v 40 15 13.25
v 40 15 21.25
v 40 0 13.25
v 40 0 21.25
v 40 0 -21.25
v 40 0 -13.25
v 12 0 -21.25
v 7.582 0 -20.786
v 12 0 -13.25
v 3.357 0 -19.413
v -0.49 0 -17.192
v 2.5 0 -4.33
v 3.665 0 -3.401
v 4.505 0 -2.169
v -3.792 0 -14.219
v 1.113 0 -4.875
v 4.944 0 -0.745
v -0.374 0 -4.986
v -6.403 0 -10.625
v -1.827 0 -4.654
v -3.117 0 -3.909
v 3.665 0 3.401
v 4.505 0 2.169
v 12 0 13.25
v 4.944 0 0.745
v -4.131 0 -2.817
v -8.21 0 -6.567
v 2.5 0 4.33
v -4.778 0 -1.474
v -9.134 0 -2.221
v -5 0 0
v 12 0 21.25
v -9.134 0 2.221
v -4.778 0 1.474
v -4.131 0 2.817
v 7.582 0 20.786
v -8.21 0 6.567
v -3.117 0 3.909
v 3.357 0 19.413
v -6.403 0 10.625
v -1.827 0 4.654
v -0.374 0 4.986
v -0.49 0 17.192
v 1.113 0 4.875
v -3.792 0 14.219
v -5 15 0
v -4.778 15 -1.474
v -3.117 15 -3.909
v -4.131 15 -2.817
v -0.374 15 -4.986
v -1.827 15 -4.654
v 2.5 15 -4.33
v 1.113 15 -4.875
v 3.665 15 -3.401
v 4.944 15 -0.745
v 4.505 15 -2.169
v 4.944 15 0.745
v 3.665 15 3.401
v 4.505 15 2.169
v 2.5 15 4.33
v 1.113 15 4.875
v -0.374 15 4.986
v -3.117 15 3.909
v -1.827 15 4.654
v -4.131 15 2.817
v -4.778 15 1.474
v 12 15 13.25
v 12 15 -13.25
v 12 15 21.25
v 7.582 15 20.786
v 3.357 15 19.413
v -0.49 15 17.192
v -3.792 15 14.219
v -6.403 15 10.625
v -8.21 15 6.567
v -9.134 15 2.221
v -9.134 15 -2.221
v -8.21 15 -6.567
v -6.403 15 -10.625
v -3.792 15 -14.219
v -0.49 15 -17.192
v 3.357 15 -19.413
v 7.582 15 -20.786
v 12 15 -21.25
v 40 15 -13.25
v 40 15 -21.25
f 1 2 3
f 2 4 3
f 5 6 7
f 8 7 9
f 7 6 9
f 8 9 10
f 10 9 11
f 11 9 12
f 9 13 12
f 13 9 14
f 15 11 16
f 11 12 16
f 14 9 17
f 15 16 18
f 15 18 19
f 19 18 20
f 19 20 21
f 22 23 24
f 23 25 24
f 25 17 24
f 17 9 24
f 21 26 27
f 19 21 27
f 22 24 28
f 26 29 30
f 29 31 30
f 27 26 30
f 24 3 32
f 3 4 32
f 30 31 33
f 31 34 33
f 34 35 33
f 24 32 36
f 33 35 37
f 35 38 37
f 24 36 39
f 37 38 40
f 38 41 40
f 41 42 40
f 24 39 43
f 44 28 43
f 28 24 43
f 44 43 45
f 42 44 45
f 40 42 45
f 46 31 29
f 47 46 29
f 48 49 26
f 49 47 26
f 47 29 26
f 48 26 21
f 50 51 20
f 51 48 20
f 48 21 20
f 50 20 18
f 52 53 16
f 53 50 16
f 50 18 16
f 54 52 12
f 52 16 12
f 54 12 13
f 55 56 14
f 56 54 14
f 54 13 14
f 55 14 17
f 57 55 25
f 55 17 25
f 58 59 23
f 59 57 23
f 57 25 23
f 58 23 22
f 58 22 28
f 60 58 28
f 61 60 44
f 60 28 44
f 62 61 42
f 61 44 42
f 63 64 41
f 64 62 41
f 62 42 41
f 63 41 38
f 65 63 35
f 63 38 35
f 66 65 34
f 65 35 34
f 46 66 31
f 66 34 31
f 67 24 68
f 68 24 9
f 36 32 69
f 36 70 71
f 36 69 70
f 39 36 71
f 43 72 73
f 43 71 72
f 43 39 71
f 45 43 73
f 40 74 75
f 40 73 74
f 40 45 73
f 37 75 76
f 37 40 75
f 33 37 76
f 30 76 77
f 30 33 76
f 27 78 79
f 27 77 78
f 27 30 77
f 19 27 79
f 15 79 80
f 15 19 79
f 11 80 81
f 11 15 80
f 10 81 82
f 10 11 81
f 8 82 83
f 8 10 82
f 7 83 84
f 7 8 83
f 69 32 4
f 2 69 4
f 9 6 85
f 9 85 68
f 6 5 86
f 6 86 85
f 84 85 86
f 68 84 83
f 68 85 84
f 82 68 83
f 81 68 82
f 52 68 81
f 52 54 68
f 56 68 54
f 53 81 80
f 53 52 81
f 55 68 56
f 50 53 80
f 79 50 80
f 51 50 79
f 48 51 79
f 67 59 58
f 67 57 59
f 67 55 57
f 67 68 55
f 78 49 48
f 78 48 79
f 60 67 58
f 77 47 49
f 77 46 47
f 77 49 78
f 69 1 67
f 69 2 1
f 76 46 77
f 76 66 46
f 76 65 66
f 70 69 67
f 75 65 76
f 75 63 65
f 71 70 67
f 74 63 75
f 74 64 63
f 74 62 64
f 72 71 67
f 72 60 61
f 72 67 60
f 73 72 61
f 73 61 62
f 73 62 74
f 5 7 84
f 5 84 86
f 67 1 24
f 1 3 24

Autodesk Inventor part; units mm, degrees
ref_plane "YZ Plane" through (0, 0, 0) normal (1, 0, 0) x (0, 1, 0)
ref_plane "XZ Plane" through (0, 0, 0) normal (0, 1, 0) x (-1, 0, 0)
ref_plane "XY Plane" through (0, 0, 0) normal (0, 0, 1) x (1, 0, 0)
sketch "Sketch1" plane through (0, 0, 0) normal (0, 1, 0) x (-1, 0, 0)
  circle A0 centre (0, 0) radius 5
  line L0 (-12, 13.25) -> (-12, -13.25)
  line L1 (-49.85, 0) -> (19.1, 0) construction
  arc A1 (-12, -21.25) -> (-12, 21.25) centre (-12, 0) ccw
  line L2 (-12, -21.25) -> (-40, -21.25)
  line L3 (-40, -21.25) -> (-40, -13.25)
  line L4 (-40, -13.25) -> (-12, -13.25)
  line L5 (-12, 21.25) -> (-40, 21.25)
  line L6 (-40, 21.25) -> (-40, 13.25)
  line L7 (-40, 13.25) -> (-12, 13.25)
  dimension "d0" = 10
  dimension "d1" = 42.5
  dimension "d2" = 12
  dimension "d3" = 8
  dimension "d4" = 28
  dimension "d5" = 21.25
extrude "Extrusion1" add sketch "Sketch1" along normal blind 15
properties part number "giunto_barra_estrusore"
